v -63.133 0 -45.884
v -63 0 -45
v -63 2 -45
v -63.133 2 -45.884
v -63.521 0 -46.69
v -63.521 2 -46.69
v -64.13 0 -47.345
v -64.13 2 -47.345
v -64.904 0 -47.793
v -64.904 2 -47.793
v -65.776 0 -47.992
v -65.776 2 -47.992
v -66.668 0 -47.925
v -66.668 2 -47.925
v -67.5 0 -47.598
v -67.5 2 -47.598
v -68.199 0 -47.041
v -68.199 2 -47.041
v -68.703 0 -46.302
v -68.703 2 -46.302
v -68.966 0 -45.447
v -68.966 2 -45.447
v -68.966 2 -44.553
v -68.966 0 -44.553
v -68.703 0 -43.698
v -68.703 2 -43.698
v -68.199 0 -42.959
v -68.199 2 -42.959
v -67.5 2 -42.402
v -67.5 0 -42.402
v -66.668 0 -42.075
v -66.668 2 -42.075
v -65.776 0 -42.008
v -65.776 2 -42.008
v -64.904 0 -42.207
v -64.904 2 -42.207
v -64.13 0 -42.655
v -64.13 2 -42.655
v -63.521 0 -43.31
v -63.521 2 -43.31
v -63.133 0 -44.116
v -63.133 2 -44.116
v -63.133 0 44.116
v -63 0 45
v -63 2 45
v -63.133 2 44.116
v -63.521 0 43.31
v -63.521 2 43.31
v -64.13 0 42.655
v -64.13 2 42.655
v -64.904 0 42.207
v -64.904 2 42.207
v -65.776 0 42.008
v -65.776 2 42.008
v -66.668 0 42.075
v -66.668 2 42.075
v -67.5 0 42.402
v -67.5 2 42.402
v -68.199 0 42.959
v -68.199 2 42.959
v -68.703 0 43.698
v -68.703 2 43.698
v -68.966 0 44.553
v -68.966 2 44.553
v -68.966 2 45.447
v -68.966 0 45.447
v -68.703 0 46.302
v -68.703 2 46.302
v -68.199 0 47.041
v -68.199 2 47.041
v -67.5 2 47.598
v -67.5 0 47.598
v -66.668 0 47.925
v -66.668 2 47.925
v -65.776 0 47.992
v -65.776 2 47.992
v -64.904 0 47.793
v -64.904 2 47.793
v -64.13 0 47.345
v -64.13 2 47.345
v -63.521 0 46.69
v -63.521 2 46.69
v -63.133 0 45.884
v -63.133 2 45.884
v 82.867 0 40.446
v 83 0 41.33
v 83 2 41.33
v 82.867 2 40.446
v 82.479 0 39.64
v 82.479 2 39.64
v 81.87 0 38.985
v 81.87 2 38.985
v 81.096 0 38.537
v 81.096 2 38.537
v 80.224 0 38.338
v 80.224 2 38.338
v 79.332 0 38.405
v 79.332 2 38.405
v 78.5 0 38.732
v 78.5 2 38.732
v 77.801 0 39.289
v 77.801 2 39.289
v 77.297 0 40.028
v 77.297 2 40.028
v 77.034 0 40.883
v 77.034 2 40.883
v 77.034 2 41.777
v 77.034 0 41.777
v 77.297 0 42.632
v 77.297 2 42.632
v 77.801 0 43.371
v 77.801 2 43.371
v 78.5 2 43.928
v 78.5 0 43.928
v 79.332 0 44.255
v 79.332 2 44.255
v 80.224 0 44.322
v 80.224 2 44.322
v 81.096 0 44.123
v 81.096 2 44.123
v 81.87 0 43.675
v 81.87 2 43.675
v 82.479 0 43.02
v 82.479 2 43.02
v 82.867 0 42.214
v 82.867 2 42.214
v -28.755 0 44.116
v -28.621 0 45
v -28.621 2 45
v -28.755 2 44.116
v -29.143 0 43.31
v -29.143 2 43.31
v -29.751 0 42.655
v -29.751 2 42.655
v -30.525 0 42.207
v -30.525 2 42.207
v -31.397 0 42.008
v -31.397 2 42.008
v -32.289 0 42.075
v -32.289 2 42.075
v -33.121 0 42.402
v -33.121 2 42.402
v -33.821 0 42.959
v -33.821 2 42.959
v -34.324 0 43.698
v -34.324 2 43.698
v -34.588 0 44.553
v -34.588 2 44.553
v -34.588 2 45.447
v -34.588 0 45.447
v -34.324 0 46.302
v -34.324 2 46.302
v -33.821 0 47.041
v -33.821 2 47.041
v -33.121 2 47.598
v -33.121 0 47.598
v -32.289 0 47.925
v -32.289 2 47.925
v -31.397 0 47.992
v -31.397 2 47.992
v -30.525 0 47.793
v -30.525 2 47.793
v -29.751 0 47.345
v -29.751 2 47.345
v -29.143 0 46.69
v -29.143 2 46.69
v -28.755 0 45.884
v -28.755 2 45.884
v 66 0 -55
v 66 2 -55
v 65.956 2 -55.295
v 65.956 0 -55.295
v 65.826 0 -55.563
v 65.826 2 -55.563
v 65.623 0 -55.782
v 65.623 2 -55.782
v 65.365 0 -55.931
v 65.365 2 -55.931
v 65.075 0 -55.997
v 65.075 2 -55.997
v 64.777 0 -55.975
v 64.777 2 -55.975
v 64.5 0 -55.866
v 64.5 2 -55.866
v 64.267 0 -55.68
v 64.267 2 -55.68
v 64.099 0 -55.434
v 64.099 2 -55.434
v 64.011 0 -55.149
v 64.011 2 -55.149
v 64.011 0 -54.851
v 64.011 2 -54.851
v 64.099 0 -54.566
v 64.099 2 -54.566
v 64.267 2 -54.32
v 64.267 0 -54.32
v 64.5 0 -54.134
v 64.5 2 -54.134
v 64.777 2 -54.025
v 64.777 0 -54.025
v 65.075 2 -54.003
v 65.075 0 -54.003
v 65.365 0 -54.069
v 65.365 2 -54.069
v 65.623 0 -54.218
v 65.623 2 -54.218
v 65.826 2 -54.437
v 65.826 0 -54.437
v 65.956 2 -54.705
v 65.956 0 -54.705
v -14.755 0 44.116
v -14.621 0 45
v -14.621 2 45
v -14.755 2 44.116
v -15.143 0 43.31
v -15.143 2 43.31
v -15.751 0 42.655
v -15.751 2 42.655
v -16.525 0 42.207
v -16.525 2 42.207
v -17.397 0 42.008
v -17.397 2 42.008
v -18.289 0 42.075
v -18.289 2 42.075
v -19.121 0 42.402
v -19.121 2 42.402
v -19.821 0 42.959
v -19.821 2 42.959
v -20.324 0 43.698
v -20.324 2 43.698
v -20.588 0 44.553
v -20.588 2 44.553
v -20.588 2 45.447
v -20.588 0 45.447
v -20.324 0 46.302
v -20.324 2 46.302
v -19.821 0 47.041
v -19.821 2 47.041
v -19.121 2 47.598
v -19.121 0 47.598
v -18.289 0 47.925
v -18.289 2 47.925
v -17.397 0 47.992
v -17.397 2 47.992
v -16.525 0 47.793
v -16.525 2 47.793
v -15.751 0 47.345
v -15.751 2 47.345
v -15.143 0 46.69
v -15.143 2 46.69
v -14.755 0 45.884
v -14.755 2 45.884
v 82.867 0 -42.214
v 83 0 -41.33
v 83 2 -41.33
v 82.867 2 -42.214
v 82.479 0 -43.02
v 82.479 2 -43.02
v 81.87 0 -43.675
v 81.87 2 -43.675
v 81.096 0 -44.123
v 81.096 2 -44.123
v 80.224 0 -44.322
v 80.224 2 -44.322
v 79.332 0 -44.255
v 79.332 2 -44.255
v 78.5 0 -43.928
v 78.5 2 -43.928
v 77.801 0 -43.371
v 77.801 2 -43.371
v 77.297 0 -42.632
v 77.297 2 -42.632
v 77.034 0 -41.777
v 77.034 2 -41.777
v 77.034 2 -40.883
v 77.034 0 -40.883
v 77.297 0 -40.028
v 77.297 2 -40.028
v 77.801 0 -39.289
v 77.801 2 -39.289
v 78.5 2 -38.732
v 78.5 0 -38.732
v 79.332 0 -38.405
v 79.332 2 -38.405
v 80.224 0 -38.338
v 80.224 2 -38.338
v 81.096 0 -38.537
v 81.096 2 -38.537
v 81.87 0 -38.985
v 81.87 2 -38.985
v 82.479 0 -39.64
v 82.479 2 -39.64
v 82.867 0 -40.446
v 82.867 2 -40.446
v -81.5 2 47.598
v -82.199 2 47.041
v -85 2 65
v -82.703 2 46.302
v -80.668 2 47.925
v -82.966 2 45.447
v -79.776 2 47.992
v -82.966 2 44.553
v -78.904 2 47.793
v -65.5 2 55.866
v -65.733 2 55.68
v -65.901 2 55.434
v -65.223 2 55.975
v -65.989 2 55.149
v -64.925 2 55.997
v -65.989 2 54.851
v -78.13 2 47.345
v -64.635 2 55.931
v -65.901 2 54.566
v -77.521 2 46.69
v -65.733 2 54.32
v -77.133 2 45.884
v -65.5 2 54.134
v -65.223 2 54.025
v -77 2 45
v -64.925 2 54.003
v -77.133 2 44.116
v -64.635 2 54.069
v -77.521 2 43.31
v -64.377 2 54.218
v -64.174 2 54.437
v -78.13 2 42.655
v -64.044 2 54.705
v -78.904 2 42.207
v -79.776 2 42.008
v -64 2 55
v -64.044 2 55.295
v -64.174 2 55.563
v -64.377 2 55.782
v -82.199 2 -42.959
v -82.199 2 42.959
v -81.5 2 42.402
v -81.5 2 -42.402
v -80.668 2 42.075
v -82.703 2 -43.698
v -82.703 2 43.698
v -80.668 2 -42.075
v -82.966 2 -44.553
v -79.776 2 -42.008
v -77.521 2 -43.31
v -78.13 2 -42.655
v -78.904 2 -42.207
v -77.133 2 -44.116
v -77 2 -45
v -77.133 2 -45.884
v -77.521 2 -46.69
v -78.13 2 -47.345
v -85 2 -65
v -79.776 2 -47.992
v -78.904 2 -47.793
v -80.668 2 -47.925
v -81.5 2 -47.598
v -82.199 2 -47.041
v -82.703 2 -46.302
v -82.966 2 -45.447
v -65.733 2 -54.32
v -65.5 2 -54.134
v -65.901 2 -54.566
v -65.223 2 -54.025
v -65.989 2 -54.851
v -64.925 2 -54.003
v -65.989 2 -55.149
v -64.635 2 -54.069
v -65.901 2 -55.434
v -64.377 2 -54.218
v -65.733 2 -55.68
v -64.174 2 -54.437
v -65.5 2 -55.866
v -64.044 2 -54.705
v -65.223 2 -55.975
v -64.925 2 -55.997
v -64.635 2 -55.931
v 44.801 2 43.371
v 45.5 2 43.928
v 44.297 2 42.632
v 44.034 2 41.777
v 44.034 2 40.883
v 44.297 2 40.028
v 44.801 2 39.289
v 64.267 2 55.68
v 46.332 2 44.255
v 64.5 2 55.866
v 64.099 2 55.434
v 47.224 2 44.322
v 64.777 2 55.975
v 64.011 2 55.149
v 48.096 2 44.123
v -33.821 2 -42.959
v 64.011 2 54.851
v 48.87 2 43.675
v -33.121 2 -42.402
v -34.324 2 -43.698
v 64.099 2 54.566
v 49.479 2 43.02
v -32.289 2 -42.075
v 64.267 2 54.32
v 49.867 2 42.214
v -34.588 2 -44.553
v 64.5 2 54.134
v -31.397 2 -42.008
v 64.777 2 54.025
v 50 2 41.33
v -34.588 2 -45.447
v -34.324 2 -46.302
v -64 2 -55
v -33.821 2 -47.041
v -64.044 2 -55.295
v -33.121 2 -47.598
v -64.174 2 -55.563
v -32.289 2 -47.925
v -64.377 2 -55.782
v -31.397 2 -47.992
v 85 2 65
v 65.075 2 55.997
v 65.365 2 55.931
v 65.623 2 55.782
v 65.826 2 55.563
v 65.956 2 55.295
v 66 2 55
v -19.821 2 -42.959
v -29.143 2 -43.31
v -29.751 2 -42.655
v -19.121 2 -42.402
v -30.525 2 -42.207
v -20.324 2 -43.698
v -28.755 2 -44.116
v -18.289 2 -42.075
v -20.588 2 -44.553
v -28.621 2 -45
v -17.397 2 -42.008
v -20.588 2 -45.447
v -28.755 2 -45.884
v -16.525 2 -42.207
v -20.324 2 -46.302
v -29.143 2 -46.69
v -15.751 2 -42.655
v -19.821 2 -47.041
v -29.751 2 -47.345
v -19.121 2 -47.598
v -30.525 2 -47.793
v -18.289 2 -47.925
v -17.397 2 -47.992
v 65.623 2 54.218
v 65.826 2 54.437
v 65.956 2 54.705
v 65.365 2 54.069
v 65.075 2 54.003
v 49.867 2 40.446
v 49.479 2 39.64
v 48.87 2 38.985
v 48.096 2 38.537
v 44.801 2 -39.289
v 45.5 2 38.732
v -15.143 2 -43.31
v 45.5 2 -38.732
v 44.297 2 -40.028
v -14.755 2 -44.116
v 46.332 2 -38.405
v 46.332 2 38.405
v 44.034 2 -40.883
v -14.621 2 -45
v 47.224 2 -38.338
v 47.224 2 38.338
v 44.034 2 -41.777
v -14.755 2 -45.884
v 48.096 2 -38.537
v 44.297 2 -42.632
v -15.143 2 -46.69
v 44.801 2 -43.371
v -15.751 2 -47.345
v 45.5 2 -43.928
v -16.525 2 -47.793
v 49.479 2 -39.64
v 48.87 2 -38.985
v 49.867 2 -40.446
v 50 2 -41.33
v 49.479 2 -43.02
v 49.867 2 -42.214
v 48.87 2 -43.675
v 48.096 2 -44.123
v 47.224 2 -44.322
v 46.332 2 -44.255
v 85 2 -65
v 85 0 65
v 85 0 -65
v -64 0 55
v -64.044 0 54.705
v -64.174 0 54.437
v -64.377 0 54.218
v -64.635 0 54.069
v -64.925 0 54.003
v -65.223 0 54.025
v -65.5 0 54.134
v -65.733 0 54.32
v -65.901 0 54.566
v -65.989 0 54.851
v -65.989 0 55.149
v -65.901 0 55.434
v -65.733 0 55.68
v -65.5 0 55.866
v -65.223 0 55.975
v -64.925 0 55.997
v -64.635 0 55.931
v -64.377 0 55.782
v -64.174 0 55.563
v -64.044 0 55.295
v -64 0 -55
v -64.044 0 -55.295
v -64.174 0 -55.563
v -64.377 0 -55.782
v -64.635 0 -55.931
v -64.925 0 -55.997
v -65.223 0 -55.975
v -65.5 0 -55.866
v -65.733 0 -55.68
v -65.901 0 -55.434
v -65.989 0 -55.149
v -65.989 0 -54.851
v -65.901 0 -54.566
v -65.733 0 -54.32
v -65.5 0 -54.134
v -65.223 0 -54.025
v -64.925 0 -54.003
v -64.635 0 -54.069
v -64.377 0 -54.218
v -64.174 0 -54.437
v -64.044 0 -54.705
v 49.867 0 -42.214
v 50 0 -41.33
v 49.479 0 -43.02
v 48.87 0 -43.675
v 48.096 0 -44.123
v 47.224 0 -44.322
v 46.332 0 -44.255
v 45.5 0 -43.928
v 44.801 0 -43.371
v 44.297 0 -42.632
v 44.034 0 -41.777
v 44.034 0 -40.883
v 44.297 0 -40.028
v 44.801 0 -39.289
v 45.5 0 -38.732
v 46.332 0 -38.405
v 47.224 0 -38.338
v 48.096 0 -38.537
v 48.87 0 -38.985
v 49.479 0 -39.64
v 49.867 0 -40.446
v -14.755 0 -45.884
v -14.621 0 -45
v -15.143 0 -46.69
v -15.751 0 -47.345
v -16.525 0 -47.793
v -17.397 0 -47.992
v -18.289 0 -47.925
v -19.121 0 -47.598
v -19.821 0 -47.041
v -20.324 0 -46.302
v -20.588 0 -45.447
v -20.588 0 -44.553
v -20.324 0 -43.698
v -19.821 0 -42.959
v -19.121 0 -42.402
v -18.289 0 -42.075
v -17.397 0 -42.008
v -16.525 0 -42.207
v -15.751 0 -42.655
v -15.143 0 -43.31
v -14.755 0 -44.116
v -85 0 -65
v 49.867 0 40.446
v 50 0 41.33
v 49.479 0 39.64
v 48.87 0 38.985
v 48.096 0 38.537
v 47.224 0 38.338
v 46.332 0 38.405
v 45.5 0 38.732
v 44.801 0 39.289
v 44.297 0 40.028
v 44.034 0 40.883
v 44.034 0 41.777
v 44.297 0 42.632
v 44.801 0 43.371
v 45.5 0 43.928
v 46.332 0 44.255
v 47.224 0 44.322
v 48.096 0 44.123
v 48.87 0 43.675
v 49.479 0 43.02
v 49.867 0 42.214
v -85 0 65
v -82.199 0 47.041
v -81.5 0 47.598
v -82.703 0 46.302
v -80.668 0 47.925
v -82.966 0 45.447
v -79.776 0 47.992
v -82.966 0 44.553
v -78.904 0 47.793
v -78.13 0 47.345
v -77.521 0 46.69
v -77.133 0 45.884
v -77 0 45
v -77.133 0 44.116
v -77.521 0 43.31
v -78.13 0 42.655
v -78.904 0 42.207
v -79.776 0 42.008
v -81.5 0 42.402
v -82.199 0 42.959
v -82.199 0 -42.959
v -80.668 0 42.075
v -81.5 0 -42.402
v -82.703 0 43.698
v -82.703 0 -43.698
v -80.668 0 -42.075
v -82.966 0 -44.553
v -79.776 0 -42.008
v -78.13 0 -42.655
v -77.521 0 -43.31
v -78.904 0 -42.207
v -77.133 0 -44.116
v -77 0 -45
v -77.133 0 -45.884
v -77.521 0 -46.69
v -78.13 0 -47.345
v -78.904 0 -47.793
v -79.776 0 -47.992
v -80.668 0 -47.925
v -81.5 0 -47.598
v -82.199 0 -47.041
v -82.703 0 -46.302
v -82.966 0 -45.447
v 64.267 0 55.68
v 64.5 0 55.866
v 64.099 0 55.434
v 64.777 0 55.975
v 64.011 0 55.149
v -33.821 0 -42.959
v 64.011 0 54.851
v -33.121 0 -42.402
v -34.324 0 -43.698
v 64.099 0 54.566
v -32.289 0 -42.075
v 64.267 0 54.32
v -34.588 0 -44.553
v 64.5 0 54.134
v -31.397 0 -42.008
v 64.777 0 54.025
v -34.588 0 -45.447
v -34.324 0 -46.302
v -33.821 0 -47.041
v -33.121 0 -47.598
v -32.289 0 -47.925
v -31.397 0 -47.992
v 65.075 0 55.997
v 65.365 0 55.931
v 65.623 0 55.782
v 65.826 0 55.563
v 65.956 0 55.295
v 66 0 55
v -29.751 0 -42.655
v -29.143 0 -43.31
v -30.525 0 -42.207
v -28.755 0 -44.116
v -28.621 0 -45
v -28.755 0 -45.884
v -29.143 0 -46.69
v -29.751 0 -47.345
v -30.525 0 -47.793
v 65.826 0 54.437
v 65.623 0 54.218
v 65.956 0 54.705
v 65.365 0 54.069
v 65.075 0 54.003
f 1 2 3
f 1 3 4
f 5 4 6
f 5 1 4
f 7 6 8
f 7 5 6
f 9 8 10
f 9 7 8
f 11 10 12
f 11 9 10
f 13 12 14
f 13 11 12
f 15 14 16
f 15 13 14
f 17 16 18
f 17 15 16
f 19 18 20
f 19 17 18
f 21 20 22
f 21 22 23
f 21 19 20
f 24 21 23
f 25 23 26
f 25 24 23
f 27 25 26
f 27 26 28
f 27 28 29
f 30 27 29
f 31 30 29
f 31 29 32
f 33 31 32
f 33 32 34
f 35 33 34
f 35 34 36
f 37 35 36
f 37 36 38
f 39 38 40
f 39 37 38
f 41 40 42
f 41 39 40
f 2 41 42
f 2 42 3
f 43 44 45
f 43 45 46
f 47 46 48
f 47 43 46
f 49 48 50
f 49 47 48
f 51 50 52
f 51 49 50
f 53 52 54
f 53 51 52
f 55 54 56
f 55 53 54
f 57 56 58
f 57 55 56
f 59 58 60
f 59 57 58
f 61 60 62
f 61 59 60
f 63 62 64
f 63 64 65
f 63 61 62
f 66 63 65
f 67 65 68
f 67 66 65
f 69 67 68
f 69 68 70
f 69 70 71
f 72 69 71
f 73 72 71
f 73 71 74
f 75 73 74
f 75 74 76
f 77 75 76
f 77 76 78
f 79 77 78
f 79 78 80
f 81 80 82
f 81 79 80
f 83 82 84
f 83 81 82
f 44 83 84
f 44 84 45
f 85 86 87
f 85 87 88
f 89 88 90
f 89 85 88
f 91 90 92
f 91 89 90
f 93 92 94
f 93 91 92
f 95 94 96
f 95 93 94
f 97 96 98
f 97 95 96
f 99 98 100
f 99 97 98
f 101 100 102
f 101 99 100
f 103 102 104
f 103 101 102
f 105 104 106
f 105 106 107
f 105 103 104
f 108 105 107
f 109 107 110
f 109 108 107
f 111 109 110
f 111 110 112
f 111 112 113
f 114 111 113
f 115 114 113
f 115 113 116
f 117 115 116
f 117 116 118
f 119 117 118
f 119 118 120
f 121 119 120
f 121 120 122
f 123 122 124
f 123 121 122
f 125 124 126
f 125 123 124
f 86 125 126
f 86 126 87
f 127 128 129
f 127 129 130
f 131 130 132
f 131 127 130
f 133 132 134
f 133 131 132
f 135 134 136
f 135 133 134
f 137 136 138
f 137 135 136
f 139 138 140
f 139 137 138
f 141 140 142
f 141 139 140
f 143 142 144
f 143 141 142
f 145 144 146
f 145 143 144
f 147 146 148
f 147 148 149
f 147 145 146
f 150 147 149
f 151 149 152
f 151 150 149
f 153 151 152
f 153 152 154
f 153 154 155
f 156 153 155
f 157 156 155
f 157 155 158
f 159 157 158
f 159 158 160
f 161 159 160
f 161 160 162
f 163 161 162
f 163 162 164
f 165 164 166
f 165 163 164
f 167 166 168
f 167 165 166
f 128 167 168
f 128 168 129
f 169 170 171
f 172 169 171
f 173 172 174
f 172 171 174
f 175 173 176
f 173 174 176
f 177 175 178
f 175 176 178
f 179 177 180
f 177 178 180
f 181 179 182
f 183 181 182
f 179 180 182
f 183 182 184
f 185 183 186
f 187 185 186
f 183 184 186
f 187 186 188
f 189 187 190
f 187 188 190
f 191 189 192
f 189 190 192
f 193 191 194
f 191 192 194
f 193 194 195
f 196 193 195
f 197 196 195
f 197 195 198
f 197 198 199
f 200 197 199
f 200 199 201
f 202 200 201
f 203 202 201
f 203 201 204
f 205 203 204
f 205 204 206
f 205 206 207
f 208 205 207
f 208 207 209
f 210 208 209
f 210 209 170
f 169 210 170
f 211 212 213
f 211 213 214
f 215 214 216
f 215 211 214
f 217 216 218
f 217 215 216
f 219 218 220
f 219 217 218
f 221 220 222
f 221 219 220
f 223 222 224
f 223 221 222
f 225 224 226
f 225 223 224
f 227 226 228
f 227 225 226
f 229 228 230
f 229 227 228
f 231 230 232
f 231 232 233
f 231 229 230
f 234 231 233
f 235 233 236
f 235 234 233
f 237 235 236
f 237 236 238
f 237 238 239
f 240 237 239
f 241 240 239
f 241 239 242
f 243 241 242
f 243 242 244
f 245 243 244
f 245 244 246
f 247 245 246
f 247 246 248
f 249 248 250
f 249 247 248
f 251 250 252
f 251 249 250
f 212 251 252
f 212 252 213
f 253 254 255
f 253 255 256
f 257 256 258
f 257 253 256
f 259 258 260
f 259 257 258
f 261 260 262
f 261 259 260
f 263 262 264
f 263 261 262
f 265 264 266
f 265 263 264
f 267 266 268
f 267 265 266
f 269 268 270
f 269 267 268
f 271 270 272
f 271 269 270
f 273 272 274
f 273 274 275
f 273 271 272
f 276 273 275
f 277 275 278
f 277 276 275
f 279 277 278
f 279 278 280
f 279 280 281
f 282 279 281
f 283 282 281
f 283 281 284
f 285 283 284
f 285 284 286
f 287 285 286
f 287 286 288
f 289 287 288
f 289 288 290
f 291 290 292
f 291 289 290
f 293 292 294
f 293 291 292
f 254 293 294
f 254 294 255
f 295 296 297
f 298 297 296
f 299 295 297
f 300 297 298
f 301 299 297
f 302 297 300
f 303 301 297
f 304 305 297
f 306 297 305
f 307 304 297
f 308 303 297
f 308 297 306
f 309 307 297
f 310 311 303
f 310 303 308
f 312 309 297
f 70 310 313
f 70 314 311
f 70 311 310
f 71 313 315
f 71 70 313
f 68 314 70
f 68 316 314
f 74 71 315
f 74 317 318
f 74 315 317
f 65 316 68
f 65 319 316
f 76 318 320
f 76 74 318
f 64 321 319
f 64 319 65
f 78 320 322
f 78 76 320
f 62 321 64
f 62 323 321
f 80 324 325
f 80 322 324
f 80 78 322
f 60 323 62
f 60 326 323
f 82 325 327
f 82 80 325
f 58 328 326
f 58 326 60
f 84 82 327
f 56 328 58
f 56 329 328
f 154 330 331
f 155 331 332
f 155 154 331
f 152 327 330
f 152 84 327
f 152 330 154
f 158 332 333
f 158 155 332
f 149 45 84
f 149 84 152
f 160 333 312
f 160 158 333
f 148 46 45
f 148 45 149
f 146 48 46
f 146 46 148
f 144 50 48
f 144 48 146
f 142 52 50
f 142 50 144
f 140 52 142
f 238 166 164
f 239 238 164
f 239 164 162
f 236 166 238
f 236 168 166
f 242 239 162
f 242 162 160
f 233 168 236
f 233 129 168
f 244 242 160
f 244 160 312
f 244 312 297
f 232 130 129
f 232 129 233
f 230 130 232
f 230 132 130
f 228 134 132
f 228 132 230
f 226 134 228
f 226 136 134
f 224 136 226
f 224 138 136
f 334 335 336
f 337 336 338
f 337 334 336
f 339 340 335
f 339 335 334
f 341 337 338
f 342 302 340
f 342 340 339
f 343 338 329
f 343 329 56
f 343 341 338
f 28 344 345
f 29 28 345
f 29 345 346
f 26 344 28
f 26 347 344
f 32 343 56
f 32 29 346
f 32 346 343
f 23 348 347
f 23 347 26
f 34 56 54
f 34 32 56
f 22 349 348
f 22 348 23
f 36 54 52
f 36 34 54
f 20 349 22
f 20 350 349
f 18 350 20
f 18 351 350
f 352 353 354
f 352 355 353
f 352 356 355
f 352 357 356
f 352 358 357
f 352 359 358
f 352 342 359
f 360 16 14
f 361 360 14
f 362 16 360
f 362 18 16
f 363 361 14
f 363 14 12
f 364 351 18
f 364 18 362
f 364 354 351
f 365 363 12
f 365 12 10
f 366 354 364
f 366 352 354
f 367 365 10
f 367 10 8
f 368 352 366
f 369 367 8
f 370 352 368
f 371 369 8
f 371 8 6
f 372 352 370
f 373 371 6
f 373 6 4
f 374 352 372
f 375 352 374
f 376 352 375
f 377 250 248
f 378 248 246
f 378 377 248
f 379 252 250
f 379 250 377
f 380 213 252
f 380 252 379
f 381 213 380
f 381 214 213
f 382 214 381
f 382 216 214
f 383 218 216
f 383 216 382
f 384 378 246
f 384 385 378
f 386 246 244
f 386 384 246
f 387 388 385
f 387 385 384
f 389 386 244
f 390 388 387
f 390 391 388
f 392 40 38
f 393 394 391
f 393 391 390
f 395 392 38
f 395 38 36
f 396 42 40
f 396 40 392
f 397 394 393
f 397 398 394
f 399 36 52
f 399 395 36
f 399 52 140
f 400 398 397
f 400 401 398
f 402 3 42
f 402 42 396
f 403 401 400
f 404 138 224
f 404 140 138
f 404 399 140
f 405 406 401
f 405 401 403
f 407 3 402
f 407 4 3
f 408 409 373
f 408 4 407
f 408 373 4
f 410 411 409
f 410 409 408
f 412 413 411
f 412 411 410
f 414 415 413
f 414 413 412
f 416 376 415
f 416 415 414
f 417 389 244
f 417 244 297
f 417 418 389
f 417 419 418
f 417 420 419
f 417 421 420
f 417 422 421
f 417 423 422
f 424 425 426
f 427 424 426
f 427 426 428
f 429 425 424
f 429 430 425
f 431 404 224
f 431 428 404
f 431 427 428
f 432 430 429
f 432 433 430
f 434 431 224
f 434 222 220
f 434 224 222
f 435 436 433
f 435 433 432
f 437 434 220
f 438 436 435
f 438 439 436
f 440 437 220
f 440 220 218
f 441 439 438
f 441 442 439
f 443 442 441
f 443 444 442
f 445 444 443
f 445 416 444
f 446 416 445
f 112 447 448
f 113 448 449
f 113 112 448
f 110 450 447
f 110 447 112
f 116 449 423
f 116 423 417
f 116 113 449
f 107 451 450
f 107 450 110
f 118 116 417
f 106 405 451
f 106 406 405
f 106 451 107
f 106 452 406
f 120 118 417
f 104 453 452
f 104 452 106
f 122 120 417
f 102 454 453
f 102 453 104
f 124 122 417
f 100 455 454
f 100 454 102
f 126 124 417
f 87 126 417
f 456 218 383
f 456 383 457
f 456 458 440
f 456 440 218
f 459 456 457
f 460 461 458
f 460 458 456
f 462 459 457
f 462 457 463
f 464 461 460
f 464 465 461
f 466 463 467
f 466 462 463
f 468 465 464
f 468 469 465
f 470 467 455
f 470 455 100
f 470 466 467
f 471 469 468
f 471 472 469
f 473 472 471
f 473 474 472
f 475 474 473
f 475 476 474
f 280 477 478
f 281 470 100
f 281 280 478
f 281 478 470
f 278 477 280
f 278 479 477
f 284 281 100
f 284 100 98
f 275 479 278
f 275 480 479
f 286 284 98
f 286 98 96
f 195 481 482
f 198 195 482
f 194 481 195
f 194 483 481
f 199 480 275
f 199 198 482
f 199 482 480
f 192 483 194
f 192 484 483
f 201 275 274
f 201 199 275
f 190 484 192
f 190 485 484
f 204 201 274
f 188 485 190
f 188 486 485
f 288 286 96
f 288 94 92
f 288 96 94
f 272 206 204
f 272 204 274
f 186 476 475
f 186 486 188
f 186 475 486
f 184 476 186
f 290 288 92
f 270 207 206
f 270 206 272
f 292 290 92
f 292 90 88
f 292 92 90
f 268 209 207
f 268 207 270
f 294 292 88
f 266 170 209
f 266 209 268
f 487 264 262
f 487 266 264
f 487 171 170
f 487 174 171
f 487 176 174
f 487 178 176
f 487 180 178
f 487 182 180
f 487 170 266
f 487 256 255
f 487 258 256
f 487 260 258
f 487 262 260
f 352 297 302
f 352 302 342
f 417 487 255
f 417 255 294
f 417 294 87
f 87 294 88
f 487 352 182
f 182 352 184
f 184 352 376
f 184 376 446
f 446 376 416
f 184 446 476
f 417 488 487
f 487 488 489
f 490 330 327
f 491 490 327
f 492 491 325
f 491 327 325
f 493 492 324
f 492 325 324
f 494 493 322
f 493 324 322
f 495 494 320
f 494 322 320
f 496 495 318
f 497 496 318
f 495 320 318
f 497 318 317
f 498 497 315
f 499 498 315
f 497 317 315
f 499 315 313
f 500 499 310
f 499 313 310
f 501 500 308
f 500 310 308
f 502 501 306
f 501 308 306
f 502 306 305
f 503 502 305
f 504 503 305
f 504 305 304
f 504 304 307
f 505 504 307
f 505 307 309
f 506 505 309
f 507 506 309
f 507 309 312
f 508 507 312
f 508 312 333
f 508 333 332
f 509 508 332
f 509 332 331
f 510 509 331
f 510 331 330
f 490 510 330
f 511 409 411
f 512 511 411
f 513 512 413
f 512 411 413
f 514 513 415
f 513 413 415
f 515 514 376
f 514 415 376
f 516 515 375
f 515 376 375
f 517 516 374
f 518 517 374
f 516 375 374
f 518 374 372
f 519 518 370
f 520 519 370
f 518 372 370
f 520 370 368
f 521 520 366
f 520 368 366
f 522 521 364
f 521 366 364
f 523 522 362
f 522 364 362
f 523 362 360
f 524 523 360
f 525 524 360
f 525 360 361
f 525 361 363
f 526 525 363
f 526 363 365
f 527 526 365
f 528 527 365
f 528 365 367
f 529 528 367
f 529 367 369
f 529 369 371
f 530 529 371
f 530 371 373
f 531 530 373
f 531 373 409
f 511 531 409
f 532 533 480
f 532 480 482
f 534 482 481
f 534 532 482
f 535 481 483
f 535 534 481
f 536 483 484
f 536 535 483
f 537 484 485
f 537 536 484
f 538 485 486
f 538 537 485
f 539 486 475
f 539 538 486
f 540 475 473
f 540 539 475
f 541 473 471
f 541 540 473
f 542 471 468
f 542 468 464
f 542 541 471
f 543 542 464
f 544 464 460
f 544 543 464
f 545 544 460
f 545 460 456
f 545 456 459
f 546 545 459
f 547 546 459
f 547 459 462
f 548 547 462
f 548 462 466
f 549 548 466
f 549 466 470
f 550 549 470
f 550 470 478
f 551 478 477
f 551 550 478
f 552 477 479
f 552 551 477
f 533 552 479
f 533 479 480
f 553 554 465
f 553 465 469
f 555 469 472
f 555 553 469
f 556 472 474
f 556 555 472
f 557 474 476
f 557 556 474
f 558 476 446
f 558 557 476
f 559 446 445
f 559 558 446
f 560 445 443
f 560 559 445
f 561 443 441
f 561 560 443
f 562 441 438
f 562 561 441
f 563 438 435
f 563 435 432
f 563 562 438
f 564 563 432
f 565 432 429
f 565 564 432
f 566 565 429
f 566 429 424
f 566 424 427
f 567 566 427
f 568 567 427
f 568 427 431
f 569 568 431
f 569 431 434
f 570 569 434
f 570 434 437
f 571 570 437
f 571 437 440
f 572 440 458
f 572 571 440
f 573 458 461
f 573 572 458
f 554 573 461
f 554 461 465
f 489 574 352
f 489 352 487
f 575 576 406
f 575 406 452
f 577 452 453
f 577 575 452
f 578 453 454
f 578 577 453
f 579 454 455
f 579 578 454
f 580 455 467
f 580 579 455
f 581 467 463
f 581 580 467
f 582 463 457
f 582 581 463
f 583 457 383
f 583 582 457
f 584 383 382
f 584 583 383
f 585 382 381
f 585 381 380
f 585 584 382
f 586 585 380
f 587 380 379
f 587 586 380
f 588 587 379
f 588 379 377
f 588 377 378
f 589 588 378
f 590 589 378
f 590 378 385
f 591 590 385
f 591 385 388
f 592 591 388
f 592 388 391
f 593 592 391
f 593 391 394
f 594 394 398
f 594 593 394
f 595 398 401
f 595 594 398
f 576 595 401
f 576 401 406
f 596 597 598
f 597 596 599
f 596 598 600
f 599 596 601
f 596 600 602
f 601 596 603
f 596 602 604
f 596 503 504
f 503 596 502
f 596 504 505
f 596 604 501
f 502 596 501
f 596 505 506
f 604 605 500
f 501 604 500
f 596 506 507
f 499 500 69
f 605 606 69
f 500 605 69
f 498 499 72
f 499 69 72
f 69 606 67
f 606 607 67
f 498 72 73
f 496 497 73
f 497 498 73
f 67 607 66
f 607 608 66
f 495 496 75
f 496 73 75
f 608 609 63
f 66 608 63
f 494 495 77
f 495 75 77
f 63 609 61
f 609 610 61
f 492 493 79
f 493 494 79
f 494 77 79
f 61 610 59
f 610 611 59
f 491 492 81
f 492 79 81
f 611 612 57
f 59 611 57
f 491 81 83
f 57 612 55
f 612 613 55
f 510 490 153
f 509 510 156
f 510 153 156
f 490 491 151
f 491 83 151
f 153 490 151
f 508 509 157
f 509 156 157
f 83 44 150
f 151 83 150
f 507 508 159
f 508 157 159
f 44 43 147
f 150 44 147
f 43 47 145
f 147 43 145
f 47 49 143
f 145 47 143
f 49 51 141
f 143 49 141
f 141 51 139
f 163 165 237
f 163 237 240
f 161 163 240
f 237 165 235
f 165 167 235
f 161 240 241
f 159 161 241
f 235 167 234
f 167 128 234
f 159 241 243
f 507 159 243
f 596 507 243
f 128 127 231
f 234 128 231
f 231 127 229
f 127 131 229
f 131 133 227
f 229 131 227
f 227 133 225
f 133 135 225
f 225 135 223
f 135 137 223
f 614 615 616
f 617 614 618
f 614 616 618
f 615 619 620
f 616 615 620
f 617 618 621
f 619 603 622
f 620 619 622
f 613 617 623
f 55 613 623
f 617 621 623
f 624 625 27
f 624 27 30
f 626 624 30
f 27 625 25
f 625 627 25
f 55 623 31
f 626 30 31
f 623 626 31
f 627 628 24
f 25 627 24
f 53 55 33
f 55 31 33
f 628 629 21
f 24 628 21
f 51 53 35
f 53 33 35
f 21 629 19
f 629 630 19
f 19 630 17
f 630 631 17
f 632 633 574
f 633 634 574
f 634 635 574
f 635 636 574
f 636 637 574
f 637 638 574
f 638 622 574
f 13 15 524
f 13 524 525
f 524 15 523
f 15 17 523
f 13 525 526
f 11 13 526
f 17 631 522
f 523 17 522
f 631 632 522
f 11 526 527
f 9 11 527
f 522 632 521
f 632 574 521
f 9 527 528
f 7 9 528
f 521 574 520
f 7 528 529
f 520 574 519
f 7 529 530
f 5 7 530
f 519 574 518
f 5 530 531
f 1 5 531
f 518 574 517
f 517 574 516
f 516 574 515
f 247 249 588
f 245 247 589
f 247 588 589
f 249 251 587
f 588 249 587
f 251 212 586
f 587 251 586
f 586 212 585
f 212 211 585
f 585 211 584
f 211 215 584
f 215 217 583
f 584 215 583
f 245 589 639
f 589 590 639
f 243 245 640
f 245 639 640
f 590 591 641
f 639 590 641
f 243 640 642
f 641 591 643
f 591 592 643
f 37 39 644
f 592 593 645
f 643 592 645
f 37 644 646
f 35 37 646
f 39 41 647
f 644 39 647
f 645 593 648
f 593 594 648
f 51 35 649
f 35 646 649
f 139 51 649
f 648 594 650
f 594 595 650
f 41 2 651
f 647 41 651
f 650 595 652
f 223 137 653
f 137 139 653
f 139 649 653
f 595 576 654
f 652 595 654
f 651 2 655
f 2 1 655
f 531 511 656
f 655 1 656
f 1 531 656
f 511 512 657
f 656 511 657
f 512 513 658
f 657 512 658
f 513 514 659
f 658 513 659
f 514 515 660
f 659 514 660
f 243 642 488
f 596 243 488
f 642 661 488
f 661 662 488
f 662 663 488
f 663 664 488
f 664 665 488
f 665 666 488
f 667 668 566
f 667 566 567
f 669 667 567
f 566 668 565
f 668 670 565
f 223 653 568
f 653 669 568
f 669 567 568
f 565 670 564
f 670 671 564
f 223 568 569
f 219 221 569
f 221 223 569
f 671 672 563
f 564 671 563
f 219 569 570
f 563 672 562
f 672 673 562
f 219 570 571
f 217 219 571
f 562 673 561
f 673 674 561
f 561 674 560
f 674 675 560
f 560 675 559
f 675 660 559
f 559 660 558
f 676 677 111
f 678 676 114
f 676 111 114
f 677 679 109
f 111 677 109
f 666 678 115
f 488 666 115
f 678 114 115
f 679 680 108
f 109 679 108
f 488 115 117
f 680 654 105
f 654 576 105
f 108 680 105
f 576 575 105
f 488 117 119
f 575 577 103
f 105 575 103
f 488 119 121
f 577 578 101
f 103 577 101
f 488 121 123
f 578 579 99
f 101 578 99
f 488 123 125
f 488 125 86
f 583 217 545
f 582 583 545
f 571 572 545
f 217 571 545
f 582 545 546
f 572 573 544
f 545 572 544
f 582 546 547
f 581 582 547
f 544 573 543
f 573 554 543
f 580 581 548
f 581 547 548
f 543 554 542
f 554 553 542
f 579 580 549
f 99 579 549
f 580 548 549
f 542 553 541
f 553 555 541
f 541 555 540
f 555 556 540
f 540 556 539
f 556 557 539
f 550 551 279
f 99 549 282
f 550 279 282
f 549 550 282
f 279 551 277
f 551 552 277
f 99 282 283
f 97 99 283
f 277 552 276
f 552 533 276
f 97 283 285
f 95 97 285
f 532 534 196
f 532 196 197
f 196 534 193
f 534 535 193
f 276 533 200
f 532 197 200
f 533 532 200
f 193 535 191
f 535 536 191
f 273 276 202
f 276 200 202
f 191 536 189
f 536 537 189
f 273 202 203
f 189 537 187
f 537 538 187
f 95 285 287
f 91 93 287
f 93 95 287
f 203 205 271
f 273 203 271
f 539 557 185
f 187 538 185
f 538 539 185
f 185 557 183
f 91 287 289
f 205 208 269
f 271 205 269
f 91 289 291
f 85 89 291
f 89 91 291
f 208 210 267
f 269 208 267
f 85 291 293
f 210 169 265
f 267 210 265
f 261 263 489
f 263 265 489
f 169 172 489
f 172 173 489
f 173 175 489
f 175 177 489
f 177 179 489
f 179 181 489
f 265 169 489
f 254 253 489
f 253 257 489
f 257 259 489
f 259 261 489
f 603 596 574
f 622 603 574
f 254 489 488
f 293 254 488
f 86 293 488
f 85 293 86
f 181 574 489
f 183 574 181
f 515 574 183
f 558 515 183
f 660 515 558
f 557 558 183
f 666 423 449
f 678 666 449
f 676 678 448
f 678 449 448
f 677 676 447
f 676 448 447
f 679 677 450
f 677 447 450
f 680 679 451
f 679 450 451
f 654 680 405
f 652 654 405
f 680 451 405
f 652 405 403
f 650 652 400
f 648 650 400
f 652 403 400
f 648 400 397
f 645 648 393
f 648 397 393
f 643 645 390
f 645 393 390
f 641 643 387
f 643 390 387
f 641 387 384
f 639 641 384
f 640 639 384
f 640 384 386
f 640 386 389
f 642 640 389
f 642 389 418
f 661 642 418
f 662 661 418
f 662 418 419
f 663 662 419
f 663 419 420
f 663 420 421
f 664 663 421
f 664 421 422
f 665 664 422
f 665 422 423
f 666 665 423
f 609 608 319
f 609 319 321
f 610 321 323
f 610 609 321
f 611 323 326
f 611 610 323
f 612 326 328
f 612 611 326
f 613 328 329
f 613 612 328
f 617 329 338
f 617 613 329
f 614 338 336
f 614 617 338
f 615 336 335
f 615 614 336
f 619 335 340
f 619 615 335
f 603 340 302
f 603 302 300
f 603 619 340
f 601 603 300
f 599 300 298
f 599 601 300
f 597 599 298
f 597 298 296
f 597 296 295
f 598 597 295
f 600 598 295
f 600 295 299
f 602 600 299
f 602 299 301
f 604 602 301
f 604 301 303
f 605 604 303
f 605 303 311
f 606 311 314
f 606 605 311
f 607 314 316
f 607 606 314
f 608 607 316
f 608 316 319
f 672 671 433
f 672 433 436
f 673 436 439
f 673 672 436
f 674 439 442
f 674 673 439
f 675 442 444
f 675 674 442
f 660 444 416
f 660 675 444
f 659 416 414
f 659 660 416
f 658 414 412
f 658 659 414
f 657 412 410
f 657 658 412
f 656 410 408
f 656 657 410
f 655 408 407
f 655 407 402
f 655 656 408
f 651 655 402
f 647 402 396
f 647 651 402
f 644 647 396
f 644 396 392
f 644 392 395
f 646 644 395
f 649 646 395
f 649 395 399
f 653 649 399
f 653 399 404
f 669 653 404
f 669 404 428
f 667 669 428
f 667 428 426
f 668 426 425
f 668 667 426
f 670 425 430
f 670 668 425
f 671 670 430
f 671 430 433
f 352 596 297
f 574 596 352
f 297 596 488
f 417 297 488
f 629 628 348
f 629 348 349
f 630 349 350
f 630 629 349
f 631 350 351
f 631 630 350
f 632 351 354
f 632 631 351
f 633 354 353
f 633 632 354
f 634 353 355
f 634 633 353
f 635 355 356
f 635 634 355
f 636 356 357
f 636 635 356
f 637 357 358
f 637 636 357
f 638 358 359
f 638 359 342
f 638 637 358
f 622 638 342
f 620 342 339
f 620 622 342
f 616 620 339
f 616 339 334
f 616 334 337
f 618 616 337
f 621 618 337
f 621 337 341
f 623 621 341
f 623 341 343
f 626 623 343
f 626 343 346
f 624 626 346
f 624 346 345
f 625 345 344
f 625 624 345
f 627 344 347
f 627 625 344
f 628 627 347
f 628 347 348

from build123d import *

# Parameters (mm, degrees)
SKETCH1_W           = 170
SKETCH1_H           = 130
SKETCH1_R           = 3
BOSS_EXTRUDE1_DEPTH = 2
SKETCH2_R           = 1
CUT_EXTRUDE1_DEPTH  = 10


with BuildPart() as part:
    # Sketch1 → Boss-Extrude1 (new body)
    with BuildSketch(Plane(origin=(0, 0, 0), x_dir=(1, 0, 0), z_dir=(0, 1, 0))):
        Rectangle(SKETCH1_W, SKETCH1_H)
        with Locations((-80, 45)):
            Circle(SKETCH1_R, mode=Mode.SUBTRACT)
        with Locations((-66, 45)):
            Circle(SKETCH1_R, mode=Mode.SUBTRACT)
        with Locations((-66, -45)):
            Circle(SKETCH1_R, mode=Mode.SUBTRACT)
        with Locations((-80, -45)):
            Circle(SKETCH1_R, mode=Mode.SUBTRACT)
        with Locations((-31.62143128, -45)):
            Circle(SKETCH1_R, mode=Mode.SUBTRACT)
        with Locations((-17.62143128, -45)):
            Circle(SKETCH1_R, mode=Mode.SUBTRACT)
        with Locations((-17.62143128, 45)):
            Circle(SKETCH1_R, mode=Mode.SUBTRACT)
        with Locations((-31.62143128, 45)):
            Circle(SKETCH1_R, mode=Mode.SUBTRACT)
        with Locations((80, 41.33)):
            Circle(SKETCH1_R, mode=Mode.SUBTRACT)
        with Locations((47, 41.33)):
            Circle(SKETCH1_R, mode=Mode.SUBTRACT)
        with Locations((80, -41.33)):
            Circle(SKETCH1_R, mode=Mode.SUBTRACT)
        with Locations((47, -41.33)):
            Circle(SKETCH1_R, mode=Mode.SUBTRACT)
    extrude(amount=BOSS_EXTRUDE1_DEPTH)

    # Sketch2 → Cut-Extrude1 (cut)
    with BuildSketch(Plane(origin=(0, 2, 0), x_dir=(1, 0, 0), z_dir=(0, 1, 0))):
        with Locations((-65, -55)):
            Circle(SKETCH2_R)
        with Locations((-65, 55)):
            Circle(SKETCH2_R)
        with Locations((65, 55)):
            Circle(SKETCH2_R)
        with Locations((65, -55)):
            Circle(SKETCH2_R)
    extrude(amount=-CUT_EXTRUDE1_DEPTH, mode=Mode.SUBTRACT)


solid = part.part
